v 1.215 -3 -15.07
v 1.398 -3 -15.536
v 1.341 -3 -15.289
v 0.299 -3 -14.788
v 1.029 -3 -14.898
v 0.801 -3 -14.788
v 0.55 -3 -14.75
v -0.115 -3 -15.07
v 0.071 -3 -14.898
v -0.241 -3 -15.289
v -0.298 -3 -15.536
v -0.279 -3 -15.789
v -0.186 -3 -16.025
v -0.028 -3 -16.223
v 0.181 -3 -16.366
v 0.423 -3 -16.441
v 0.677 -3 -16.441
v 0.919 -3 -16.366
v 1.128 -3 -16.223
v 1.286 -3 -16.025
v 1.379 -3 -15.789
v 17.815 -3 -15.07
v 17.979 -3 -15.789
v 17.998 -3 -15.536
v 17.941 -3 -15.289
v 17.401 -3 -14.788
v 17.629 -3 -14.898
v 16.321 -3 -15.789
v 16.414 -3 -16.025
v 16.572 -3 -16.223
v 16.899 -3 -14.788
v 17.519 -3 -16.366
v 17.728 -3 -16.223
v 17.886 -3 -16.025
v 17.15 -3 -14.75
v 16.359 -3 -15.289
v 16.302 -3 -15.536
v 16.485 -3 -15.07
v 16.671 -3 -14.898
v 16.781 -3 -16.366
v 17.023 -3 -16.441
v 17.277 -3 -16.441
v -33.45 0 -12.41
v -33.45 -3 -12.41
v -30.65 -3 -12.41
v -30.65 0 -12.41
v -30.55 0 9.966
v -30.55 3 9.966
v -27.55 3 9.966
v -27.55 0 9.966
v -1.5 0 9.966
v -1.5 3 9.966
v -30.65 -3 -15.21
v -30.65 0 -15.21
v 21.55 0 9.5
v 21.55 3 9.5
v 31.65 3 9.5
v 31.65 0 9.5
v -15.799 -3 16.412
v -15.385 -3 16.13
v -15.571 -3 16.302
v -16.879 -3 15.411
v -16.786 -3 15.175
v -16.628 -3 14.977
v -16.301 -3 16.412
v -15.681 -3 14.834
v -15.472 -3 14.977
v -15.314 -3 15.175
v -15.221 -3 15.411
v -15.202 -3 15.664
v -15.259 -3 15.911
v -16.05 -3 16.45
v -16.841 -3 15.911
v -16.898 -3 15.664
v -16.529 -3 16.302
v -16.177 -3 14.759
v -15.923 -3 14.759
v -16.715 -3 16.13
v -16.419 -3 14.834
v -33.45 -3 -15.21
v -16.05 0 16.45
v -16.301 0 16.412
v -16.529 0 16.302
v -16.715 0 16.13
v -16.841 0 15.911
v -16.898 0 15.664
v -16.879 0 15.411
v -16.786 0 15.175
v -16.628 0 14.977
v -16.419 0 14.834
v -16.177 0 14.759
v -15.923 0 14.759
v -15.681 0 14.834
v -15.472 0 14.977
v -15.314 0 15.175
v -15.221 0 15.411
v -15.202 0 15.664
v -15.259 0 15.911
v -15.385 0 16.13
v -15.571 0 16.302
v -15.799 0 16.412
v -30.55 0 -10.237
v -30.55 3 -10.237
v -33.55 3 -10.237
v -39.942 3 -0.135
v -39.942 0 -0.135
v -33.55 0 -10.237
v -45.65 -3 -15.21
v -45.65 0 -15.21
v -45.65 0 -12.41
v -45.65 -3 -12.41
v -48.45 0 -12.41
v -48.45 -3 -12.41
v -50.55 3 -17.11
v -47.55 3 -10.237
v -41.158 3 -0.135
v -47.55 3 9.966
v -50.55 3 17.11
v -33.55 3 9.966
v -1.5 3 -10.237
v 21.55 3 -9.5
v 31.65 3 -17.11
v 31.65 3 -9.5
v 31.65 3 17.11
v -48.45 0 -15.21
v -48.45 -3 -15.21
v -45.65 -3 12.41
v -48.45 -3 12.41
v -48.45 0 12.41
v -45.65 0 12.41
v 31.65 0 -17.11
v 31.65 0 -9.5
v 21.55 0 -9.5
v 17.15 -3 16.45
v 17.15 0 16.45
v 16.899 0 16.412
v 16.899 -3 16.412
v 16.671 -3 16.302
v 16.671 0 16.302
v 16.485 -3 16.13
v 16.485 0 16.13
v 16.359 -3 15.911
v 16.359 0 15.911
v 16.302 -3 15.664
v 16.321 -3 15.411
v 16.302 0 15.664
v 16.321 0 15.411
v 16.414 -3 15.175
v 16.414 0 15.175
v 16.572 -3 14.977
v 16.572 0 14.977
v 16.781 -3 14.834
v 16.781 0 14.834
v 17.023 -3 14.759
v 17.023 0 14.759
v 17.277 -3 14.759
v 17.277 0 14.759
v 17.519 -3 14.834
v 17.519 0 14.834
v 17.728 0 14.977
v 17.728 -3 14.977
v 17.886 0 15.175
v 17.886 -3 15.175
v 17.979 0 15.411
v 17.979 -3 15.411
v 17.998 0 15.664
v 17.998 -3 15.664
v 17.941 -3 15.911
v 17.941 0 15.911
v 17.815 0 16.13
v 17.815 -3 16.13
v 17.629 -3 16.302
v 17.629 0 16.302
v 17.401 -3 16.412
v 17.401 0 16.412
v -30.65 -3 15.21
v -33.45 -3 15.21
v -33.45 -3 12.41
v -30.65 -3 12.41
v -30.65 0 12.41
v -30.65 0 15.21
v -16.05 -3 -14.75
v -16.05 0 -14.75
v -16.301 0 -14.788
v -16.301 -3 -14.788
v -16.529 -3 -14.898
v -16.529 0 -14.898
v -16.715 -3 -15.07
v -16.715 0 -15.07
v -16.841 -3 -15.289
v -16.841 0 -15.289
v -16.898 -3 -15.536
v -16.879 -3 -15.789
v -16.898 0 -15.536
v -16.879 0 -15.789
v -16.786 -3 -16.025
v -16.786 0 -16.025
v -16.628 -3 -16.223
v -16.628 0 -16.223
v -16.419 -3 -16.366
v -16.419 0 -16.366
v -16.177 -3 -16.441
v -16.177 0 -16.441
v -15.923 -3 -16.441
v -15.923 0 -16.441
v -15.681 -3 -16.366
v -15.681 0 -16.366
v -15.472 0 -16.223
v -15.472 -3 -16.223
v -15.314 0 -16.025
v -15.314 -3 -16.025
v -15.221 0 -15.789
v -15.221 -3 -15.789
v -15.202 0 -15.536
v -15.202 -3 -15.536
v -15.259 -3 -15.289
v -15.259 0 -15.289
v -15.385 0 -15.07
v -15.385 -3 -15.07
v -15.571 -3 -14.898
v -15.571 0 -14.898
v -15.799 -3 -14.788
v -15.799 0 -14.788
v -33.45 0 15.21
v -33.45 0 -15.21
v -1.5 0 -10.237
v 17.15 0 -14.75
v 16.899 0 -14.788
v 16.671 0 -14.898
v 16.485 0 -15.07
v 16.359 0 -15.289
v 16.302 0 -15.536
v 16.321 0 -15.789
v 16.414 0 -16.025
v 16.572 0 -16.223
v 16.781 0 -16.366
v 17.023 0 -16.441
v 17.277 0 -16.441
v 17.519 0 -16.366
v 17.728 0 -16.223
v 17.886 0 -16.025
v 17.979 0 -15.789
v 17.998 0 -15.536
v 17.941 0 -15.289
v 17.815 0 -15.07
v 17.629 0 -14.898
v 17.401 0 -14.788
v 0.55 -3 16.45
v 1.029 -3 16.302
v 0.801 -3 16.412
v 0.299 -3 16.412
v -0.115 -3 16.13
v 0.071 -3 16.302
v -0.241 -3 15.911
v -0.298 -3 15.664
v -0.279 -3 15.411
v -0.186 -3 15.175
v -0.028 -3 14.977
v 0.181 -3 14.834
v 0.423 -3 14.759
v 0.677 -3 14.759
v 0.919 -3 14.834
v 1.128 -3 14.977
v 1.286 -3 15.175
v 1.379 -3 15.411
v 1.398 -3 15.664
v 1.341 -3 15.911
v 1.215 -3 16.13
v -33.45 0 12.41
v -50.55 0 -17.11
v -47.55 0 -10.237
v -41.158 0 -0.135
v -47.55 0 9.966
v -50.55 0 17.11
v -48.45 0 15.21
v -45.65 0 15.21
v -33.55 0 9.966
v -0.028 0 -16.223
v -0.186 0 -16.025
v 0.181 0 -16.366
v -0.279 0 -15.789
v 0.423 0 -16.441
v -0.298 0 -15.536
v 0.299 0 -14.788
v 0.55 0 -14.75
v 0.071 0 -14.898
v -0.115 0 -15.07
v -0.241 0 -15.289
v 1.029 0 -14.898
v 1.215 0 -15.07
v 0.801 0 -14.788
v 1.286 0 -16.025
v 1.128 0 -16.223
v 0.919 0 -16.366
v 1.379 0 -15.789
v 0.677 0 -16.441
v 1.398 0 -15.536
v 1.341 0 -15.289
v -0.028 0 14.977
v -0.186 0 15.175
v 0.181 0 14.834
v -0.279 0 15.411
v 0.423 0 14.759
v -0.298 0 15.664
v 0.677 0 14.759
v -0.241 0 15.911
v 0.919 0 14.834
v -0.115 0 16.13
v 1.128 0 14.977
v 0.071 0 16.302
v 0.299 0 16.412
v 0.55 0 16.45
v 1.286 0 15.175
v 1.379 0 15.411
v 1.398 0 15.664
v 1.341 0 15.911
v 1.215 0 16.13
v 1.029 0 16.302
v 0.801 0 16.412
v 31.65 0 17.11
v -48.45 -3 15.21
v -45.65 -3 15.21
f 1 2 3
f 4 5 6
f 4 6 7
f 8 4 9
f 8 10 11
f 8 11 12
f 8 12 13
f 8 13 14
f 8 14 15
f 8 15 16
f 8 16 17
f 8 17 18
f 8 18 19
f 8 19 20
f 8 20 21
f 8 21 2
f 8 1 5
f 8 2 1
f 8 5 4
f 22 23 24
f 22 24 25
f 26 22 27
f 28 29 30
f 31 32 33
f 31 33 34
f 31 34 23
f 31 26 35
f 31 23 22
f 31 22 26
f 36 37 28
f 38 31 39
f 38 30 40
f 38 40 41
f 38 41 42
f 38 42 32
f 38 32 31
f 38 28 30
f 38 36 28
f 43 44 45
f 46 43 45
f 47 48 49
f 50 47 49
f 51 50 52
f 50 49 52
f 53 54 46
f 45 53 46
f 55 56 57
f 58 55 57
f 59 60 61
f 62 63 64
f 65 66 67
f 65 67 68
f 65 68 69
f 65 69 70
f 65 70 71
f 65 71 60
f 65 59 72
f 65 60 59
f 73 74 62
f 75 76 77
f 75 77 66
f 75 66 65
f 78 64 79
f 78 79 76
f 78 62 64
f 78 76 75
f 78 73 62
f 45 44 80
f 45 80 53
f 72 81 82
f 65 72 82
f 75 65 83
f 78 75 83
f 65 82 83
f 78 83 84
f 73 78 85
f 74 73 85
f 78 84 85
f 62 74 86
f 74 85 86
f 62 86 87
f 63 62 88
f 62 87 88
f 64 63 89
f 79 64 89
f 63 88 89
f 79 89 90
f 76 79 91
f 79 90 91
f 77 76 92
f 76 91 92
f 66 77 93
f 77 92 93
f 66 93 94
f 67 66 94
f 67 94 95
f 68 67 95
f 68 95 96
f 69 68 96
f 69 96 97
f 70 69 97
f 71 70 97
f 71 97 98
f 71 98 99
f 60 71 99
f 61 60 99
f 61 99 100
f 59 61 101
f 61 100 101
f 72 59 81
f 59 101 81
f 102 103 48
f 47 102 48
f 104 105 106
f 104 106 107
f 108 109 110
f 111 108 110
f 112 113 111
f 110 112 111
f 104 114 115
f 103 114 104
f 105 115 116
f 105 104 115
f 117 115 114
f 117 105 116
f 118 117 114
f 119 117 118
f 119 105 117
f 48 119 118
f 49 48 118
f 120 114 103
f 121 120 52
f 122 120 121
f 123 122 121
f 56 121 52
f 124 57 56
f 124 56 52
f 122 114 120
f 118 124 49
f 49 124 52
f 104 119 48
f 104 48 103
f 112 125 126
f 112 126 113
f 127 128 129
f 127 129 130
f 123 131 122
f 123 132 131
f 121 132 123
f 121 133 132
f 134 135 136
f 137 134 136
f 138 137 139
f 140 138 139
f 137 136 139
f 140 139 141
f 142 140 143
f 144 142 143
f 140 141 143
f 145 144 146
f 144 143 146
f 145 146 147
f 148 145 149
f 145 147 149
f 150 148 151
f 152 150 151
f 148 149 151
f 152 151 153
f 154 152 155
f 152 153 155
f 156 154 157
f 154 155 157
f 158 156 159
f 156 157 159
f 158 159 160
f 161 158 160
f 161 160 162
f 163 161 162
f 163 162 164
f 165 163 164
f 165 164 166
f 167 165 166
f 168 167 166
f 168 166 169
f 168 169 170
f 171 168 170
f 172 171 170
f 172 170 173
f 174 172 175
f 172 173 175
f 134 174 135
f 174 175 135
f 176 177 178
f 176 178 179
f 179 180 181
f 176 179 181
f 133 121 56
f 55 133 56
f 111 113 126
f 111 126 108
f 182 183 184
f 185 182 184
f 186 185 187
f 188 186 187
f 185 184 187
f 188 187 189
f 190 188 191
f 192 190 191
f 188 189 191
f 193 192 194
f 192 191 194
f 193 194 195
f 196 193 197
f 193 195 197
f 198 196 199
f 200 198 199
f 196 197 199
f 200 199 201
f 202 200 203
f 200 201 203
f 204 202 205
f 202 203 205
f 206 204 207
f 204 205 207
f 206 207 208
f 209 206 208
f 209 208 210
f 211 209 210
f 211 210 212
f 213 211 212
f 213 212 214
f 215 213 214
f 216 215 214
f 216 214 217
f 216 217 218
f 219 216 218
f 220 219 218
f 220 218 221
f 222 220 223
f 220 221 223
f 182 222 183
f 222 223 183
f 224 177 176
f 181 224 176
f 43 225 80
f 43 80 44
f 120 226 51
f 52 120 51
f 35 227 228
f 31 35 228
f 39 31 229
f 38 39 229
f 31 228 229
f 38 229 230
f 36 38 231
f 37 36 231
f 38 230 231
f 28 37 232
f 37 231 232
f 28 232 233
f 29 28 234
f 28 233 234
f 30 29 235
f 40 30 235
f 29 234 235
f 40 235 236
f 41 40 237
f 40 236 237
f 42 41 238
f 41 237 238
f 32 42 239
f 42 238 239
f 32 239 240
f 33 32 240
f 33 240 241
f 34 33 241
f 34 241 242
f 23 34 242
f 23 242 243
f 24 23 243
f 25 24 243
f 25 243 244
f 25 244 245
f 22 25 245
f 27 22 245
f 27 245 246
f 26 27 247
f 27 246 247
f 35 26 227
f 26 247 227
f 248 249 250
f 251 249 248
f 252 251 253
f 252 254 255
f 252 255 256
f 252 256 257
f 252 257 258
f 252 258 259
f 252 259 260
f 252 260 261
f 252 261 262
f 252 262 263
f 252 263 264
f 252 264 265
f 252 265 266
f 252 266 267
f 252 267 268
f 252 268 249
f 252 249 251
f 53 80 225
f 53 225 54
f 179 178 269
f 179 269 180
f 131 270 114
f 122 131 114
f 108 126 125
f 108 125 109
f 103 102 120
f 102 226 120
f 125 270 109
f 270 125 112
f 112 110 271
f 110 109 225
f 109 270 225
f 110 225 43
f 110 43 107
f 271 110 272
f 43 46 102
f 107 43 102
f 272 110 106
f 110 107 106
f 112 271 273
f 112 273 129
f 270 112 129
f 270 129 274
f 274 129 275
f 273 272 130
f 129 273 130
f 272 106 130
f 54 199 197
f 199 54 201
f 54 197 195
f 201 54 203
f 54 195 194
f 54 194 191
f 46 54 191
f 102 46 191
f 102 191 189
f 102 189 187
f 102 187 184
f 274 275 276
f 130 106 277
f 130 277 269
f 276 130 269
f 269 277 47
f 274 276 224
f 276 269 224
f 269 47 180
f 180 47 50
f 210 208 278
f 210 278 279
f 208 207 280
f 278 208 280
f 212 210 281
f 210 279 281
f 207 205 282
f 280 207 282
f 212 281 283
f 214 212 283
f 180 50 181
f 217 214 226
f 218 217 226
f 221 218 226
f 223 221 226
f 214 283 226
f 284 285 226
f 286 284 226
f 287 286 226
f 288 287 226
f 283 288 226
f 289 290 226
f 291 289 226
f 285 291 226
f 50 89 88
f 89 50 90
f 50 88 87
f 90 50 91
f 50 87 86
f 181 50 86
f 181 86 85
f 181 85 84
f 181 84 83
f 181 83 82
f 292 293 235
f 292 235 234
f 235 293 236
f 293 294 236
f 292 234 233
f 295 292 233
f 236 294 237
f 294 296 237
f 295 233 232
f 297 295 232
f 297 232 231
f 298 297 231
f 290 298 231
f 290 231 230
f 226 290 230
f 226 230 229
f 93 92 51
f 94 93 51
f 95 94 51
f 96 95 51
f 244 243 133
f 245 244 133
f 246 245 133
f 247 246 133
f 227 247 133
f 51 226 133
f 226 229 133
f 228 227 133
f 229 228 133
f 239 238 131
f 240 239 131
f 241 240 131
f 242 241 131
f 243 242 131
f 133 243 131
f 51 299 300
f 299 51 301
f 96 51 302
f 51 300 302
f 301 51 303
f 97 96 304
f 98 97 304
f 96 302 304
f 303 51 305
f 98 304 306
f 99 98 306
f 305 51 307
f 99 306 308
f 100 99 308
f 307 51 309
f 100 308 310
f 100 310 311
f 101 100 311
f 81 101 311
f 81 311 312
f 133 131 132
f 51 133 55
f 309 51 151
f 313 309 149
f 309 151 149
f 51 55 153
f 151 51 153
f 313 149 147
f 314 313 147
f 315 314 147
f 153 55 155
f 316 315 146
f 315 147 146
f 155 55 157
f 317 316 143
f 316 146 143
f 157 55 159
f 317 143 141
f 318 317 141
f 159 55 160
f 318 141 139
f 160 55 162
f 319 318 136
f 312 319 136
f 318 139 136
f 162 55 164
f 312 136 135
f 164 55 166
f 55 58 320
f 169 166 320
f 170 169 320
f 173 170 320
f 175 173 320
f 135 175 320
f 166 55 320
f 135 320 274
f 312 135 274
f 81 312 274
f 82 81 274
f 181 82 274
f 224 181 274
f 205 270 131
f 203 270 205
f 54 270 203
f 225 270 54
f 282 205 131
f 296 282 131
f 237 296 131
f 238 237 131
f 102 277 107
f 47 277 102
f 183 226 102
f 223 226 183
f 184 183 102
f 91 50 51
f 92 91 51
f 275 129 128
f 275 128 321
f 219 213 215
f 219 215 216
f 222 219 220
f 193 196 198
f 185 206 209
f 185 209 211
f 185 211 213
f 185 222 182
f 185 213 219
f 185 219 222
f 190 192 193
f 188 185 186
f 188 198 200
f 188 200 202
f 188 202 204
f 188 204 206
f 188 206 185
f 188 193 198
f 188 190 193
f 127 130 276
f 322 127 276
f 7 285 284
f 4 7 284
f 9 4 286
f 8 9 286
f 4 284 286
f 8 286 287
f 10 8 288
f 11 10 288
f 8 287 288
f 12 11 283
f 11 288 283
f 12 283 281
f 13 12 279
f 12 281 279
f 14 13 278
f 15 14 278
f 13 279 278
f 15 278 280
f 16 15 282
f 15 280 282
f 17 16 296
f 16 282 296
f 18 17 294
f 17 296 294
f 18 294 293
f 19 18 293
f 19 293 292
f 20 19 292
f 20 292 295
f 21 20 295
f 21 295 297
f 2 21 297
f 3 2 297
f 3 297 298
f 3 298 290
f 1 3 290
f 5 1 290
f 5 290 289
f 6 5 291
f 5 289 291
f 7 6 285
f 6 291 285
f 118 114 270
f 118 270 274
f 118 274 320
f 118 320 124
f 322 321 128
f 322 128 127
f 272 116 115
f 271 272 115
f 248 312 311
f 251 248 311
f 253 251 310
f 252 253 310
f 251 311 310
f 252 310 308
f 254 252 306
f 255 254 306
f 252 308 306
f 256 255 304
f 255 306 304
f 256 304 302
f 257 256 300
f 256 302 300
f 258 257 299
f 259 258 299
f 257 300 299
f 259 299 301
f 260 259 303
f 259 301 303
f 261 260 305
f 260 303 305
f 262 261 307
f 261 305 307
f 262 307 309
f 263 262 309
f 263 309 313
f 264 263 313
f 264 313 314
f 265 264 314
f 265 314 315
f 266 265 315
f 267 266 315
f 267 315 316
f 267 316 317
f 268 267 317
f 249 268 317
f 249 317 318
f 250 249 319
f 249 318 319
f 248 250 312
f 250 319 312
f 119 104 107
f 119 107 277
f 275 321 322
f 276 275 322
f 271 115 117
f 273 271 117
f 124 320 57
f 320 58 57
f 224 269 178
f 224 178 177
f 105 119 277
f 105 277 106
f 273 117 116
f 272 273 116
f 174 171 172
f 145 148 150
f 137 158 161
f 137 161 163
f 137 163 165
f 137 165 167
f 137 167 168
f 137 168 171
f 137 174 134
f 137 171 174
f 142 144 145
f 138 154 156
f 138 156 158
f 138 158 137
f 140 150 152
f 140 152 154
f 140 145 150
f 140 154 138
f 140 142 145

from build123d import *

# Parameters (mm, degrees)
SKETCH1_W           = 55.1
SKETCH1_H           = 27.8
BOSS_EXTRUDE1_DEPTH = 3
SKETCH3_W           = 21.65
SKETCH3_H           = 20.203759547
SKETCH3_W_2         = 17.65
SKETCH3_H_2         = 15.75
CUT_EXTRUDE1_DEPTH  = 32.00342723
SKETCH4_W           = 19.154601746
SKETCH4_H           = 20.203759547
CUT_EXTRUDE2_DEPTH  = 32.00342723
CUT_EXTRUDE3_DEPTH  = 10
SKETCH7_W           = 4.4
SKETCH7_H           = 3
BOSS_EXTRUDE2_DEPTH = 4.1
SKETCH8_W           = 3.662724417
SKETCH8_H           = 3
SKETCH8_W_2         = 3.933516036
BOSS_EXTRUDE3_DEPTH = 3
SKETCH9_W           = 62.2
SKETCH9_H           = 3
BOSS_EXTRUDE4_DEPTH = 3.21
SKETCH10_W          = 62.2
SKETCH10_H          = 3
BOSS_EXTRUDE5_DEPTH = 3.21
SKETCH12_W          = 34.22
SKETCH12_H          = 3
BOSS_EXTRUDE7_DEPTH = 20
CUT_EXTRUDE4_DEPTH  = 54.451422806
SKETCH14_W          = 2.8
SKETCH14_H          = 2.8
BOSS_EXTRUDE8_DEPTH = 3
SKETCH11_R          = 0.85
BOSS_EXTRUDE9_DEPTH = 3


with BuildPart() as part:
    # Sketch1 → Boss-Extrude1 (new body)
    with BuildSketch(Plane(origin=(0, 0, 0), x_dir=(1, 0, 0), z_dir=(0, 1, 0))):
        Rectangle(SKETCH1_W, SKETCH1_H)
    extrude(amount=BOSS_EXTRUDE1_DEPTH)

    # Sketch3 → Cut-Extrude1 (cut, through all)
    # profile 1 of 2: a face of its own
    with BuildSketch(Plane.XZ):
        with Locations((-12.325, -0.13539581)):
            Rectangle(SKETCH3_W, SKETCH3_H)
        with Locations((-12.325, -0.375)):
            Rectangle(SKETCH3_W_2, SKETCH3_H_2, mode=Mode.SUBTRACT)
    # profile 2 of 2: a face of its own
    with BuildSketch(Plane.XZ):
        with Locations((-12.325, -0.375)):
            Rectangle(SKETCH3_W_2, SKETCH3_H_2)
    extrude(amount=-CUT_EXTRUDE1_DEPTH, mode=Mode.SUBTRACT)

    # Sketch4 → Cut-Extrude2 (cut, through all)
    with BuildSketch(Plane(origin=(0, 3, 0), x_dir=(1, 0, 0), z_dir=(0, 1, 0))):
        with Locations((-32.727300873, 0.13539581)):
            Rectangle(SKETCH4_W, SKETCH4_H)
    extrude(amount=-CUT_EXTRUDE2_DEPTH, mode=Mode.SUBTRACT)

    # Sketch5 → Cut-Extrude3 (cut)
    with BuildSketch(Plane(origin=(0, 3, 0), x_dir=(1, 0, 0), z_dir=(0, 1, 0))):
        Polygon((27.55, -9.5), (27.55, 0), (27.55, 9.5), (21.55, 9.5), (21.55, -9.5), align=None)
    extrude(amount=-CUT_EXTRUDE3_DEPTH, mode=Mode.SUBTRACT)

    # Sketch7 → Boss-Extrude2 (add)
    with BuildSketch(Plane(origin=(27.55, 0, 0), x_dir=(0, 0, -1), z_dir=(1, 0, 0))):
        with Locations((11.7, 1.5)):
            Rectangle(SKETCH7_W, SKETCH7_H)
        with Locations((-11.7, 1.5)):
            Rectangle(SKETCH7_W, SKETCH7_H)
    extrude(amount=BOSS_EXTRUDE2_DEPTH)

    # Sketch8 → Boss-Extrude3 (add)
    with BuildSketch(Plane.ZY.offset(27.55)):
        with Locations((-12.068637792, 1.5)):
            Rectangle(SKETCH8_W, SKETCH8_H)
        with Locations((11.933241982, 1.5)):
            Rectangle(SKETCH8_W_2, SKETCH8_H)
    extrude(amount=BOSS_EXTRUDE3_DEPTH)

    # Sketch9 → Boss-Extrude4 (add)
    with BuildSketch(Plane(origin=(0, 0, -13.9), x_dir=(-1, 0, 0), z_dir=(0, 0, -1))):
        with Locations((-0.55, 1.5)):
            Rectangle(SKETCH9_W, SKETCH9_H)
    extrude(amount=BOSS_EXTRUDE4_DEPTH)

    # Sketch10 → Boss-Extrude5 (add)
    with BuildSketch(Plane.XY.offset(13.9)):
        with Locations((0.55, 1.5)):
            Rectangle(SKETCH10_W, SKETCH10_H)
    extrude(amount=BOSS_EXTRUDE5_DEPTH)

    # Sketch12 → Boss-Extrude7 (add)
    with BuildSketch(Plane.ZY.offset(30.55)):
        with Locations((0, 1.5)):
            Rectangle(SKETCH12_W, SKETCH12_H)
    extrude(amount=BOSS_EXTRUDE7_DEPTH)

    # Sketch13 → Cut-Extrude4 (cut, through all)
    with BuildSketch(Plane(origin=(0, 3, 0), x_dir=(1, 0, 0), z_dir=(0, 1, 0))):
        Polygon((-33.55, 10.237275583), (-33.55, -9.966483964), (-39.942079041, 0.13539581), align=None)
        Polygon((-47.55, 10.237275583), (-47.55, -9.966483964), (-41.157920959, 0.13539581), align=None)
    extrude(amount=-CUT_EXTRUDE4_DEPTH, mode=Mode.SUBTRACT)

    # Sketch14 → Boss-Extrude8 (add)
    with BuildSketch(Plane.XZ):
        with Locations((-47.05, 13.81)):
            Rectangle(SKETCH14_W, SKETCH14_H)
        with Locations((-47.05, -13.81)):
            Rectangle(SKETCH14_W, SKETCH14_H)
        with Locations((-32.05, 13.81)):
            Rectangle(SKETCH14_W, SKETCH14_H)
        with Locations((-32.05, -13.81)):
            Rectangle(SKETCH14_W, SKETCH14_H)
    extrude(amount=BOSS_EXTRUDE8_DEPTH)

    # Sketch11 → Boss-Extrude9 (add)
    with BuildSketch(Plane.XZ):
        with Locations(Location((-16.05, 15.6, 0), (0, 0, 90))):
            Circle(SKETCH11_R)
        with Locations(Location((-16.05, -15.6, 0), (0, 0, 90))):
            Circle(SKETCH11_R)
        with Locations(Location((0.55, -15.6, 0), (0, 0, 90))):
            Circle(SKETCH11_R)
        with Locations(Location((0.55, 15.6, 0), (0, 0, 90))):
            Circle(SKETCH11_R)
        with Locations(Location((17.15, 15.6, 0), (0, 0, 90))):
            Circle(SKETCH11_R)
        with Locations(Location((17.15, -15.6, 0), (0, 0, 90))):
            Circle(SKETCH11_R)
    extrude(amount=BOSS_EXTRUDE9_DEPTH)


solid = part.part
